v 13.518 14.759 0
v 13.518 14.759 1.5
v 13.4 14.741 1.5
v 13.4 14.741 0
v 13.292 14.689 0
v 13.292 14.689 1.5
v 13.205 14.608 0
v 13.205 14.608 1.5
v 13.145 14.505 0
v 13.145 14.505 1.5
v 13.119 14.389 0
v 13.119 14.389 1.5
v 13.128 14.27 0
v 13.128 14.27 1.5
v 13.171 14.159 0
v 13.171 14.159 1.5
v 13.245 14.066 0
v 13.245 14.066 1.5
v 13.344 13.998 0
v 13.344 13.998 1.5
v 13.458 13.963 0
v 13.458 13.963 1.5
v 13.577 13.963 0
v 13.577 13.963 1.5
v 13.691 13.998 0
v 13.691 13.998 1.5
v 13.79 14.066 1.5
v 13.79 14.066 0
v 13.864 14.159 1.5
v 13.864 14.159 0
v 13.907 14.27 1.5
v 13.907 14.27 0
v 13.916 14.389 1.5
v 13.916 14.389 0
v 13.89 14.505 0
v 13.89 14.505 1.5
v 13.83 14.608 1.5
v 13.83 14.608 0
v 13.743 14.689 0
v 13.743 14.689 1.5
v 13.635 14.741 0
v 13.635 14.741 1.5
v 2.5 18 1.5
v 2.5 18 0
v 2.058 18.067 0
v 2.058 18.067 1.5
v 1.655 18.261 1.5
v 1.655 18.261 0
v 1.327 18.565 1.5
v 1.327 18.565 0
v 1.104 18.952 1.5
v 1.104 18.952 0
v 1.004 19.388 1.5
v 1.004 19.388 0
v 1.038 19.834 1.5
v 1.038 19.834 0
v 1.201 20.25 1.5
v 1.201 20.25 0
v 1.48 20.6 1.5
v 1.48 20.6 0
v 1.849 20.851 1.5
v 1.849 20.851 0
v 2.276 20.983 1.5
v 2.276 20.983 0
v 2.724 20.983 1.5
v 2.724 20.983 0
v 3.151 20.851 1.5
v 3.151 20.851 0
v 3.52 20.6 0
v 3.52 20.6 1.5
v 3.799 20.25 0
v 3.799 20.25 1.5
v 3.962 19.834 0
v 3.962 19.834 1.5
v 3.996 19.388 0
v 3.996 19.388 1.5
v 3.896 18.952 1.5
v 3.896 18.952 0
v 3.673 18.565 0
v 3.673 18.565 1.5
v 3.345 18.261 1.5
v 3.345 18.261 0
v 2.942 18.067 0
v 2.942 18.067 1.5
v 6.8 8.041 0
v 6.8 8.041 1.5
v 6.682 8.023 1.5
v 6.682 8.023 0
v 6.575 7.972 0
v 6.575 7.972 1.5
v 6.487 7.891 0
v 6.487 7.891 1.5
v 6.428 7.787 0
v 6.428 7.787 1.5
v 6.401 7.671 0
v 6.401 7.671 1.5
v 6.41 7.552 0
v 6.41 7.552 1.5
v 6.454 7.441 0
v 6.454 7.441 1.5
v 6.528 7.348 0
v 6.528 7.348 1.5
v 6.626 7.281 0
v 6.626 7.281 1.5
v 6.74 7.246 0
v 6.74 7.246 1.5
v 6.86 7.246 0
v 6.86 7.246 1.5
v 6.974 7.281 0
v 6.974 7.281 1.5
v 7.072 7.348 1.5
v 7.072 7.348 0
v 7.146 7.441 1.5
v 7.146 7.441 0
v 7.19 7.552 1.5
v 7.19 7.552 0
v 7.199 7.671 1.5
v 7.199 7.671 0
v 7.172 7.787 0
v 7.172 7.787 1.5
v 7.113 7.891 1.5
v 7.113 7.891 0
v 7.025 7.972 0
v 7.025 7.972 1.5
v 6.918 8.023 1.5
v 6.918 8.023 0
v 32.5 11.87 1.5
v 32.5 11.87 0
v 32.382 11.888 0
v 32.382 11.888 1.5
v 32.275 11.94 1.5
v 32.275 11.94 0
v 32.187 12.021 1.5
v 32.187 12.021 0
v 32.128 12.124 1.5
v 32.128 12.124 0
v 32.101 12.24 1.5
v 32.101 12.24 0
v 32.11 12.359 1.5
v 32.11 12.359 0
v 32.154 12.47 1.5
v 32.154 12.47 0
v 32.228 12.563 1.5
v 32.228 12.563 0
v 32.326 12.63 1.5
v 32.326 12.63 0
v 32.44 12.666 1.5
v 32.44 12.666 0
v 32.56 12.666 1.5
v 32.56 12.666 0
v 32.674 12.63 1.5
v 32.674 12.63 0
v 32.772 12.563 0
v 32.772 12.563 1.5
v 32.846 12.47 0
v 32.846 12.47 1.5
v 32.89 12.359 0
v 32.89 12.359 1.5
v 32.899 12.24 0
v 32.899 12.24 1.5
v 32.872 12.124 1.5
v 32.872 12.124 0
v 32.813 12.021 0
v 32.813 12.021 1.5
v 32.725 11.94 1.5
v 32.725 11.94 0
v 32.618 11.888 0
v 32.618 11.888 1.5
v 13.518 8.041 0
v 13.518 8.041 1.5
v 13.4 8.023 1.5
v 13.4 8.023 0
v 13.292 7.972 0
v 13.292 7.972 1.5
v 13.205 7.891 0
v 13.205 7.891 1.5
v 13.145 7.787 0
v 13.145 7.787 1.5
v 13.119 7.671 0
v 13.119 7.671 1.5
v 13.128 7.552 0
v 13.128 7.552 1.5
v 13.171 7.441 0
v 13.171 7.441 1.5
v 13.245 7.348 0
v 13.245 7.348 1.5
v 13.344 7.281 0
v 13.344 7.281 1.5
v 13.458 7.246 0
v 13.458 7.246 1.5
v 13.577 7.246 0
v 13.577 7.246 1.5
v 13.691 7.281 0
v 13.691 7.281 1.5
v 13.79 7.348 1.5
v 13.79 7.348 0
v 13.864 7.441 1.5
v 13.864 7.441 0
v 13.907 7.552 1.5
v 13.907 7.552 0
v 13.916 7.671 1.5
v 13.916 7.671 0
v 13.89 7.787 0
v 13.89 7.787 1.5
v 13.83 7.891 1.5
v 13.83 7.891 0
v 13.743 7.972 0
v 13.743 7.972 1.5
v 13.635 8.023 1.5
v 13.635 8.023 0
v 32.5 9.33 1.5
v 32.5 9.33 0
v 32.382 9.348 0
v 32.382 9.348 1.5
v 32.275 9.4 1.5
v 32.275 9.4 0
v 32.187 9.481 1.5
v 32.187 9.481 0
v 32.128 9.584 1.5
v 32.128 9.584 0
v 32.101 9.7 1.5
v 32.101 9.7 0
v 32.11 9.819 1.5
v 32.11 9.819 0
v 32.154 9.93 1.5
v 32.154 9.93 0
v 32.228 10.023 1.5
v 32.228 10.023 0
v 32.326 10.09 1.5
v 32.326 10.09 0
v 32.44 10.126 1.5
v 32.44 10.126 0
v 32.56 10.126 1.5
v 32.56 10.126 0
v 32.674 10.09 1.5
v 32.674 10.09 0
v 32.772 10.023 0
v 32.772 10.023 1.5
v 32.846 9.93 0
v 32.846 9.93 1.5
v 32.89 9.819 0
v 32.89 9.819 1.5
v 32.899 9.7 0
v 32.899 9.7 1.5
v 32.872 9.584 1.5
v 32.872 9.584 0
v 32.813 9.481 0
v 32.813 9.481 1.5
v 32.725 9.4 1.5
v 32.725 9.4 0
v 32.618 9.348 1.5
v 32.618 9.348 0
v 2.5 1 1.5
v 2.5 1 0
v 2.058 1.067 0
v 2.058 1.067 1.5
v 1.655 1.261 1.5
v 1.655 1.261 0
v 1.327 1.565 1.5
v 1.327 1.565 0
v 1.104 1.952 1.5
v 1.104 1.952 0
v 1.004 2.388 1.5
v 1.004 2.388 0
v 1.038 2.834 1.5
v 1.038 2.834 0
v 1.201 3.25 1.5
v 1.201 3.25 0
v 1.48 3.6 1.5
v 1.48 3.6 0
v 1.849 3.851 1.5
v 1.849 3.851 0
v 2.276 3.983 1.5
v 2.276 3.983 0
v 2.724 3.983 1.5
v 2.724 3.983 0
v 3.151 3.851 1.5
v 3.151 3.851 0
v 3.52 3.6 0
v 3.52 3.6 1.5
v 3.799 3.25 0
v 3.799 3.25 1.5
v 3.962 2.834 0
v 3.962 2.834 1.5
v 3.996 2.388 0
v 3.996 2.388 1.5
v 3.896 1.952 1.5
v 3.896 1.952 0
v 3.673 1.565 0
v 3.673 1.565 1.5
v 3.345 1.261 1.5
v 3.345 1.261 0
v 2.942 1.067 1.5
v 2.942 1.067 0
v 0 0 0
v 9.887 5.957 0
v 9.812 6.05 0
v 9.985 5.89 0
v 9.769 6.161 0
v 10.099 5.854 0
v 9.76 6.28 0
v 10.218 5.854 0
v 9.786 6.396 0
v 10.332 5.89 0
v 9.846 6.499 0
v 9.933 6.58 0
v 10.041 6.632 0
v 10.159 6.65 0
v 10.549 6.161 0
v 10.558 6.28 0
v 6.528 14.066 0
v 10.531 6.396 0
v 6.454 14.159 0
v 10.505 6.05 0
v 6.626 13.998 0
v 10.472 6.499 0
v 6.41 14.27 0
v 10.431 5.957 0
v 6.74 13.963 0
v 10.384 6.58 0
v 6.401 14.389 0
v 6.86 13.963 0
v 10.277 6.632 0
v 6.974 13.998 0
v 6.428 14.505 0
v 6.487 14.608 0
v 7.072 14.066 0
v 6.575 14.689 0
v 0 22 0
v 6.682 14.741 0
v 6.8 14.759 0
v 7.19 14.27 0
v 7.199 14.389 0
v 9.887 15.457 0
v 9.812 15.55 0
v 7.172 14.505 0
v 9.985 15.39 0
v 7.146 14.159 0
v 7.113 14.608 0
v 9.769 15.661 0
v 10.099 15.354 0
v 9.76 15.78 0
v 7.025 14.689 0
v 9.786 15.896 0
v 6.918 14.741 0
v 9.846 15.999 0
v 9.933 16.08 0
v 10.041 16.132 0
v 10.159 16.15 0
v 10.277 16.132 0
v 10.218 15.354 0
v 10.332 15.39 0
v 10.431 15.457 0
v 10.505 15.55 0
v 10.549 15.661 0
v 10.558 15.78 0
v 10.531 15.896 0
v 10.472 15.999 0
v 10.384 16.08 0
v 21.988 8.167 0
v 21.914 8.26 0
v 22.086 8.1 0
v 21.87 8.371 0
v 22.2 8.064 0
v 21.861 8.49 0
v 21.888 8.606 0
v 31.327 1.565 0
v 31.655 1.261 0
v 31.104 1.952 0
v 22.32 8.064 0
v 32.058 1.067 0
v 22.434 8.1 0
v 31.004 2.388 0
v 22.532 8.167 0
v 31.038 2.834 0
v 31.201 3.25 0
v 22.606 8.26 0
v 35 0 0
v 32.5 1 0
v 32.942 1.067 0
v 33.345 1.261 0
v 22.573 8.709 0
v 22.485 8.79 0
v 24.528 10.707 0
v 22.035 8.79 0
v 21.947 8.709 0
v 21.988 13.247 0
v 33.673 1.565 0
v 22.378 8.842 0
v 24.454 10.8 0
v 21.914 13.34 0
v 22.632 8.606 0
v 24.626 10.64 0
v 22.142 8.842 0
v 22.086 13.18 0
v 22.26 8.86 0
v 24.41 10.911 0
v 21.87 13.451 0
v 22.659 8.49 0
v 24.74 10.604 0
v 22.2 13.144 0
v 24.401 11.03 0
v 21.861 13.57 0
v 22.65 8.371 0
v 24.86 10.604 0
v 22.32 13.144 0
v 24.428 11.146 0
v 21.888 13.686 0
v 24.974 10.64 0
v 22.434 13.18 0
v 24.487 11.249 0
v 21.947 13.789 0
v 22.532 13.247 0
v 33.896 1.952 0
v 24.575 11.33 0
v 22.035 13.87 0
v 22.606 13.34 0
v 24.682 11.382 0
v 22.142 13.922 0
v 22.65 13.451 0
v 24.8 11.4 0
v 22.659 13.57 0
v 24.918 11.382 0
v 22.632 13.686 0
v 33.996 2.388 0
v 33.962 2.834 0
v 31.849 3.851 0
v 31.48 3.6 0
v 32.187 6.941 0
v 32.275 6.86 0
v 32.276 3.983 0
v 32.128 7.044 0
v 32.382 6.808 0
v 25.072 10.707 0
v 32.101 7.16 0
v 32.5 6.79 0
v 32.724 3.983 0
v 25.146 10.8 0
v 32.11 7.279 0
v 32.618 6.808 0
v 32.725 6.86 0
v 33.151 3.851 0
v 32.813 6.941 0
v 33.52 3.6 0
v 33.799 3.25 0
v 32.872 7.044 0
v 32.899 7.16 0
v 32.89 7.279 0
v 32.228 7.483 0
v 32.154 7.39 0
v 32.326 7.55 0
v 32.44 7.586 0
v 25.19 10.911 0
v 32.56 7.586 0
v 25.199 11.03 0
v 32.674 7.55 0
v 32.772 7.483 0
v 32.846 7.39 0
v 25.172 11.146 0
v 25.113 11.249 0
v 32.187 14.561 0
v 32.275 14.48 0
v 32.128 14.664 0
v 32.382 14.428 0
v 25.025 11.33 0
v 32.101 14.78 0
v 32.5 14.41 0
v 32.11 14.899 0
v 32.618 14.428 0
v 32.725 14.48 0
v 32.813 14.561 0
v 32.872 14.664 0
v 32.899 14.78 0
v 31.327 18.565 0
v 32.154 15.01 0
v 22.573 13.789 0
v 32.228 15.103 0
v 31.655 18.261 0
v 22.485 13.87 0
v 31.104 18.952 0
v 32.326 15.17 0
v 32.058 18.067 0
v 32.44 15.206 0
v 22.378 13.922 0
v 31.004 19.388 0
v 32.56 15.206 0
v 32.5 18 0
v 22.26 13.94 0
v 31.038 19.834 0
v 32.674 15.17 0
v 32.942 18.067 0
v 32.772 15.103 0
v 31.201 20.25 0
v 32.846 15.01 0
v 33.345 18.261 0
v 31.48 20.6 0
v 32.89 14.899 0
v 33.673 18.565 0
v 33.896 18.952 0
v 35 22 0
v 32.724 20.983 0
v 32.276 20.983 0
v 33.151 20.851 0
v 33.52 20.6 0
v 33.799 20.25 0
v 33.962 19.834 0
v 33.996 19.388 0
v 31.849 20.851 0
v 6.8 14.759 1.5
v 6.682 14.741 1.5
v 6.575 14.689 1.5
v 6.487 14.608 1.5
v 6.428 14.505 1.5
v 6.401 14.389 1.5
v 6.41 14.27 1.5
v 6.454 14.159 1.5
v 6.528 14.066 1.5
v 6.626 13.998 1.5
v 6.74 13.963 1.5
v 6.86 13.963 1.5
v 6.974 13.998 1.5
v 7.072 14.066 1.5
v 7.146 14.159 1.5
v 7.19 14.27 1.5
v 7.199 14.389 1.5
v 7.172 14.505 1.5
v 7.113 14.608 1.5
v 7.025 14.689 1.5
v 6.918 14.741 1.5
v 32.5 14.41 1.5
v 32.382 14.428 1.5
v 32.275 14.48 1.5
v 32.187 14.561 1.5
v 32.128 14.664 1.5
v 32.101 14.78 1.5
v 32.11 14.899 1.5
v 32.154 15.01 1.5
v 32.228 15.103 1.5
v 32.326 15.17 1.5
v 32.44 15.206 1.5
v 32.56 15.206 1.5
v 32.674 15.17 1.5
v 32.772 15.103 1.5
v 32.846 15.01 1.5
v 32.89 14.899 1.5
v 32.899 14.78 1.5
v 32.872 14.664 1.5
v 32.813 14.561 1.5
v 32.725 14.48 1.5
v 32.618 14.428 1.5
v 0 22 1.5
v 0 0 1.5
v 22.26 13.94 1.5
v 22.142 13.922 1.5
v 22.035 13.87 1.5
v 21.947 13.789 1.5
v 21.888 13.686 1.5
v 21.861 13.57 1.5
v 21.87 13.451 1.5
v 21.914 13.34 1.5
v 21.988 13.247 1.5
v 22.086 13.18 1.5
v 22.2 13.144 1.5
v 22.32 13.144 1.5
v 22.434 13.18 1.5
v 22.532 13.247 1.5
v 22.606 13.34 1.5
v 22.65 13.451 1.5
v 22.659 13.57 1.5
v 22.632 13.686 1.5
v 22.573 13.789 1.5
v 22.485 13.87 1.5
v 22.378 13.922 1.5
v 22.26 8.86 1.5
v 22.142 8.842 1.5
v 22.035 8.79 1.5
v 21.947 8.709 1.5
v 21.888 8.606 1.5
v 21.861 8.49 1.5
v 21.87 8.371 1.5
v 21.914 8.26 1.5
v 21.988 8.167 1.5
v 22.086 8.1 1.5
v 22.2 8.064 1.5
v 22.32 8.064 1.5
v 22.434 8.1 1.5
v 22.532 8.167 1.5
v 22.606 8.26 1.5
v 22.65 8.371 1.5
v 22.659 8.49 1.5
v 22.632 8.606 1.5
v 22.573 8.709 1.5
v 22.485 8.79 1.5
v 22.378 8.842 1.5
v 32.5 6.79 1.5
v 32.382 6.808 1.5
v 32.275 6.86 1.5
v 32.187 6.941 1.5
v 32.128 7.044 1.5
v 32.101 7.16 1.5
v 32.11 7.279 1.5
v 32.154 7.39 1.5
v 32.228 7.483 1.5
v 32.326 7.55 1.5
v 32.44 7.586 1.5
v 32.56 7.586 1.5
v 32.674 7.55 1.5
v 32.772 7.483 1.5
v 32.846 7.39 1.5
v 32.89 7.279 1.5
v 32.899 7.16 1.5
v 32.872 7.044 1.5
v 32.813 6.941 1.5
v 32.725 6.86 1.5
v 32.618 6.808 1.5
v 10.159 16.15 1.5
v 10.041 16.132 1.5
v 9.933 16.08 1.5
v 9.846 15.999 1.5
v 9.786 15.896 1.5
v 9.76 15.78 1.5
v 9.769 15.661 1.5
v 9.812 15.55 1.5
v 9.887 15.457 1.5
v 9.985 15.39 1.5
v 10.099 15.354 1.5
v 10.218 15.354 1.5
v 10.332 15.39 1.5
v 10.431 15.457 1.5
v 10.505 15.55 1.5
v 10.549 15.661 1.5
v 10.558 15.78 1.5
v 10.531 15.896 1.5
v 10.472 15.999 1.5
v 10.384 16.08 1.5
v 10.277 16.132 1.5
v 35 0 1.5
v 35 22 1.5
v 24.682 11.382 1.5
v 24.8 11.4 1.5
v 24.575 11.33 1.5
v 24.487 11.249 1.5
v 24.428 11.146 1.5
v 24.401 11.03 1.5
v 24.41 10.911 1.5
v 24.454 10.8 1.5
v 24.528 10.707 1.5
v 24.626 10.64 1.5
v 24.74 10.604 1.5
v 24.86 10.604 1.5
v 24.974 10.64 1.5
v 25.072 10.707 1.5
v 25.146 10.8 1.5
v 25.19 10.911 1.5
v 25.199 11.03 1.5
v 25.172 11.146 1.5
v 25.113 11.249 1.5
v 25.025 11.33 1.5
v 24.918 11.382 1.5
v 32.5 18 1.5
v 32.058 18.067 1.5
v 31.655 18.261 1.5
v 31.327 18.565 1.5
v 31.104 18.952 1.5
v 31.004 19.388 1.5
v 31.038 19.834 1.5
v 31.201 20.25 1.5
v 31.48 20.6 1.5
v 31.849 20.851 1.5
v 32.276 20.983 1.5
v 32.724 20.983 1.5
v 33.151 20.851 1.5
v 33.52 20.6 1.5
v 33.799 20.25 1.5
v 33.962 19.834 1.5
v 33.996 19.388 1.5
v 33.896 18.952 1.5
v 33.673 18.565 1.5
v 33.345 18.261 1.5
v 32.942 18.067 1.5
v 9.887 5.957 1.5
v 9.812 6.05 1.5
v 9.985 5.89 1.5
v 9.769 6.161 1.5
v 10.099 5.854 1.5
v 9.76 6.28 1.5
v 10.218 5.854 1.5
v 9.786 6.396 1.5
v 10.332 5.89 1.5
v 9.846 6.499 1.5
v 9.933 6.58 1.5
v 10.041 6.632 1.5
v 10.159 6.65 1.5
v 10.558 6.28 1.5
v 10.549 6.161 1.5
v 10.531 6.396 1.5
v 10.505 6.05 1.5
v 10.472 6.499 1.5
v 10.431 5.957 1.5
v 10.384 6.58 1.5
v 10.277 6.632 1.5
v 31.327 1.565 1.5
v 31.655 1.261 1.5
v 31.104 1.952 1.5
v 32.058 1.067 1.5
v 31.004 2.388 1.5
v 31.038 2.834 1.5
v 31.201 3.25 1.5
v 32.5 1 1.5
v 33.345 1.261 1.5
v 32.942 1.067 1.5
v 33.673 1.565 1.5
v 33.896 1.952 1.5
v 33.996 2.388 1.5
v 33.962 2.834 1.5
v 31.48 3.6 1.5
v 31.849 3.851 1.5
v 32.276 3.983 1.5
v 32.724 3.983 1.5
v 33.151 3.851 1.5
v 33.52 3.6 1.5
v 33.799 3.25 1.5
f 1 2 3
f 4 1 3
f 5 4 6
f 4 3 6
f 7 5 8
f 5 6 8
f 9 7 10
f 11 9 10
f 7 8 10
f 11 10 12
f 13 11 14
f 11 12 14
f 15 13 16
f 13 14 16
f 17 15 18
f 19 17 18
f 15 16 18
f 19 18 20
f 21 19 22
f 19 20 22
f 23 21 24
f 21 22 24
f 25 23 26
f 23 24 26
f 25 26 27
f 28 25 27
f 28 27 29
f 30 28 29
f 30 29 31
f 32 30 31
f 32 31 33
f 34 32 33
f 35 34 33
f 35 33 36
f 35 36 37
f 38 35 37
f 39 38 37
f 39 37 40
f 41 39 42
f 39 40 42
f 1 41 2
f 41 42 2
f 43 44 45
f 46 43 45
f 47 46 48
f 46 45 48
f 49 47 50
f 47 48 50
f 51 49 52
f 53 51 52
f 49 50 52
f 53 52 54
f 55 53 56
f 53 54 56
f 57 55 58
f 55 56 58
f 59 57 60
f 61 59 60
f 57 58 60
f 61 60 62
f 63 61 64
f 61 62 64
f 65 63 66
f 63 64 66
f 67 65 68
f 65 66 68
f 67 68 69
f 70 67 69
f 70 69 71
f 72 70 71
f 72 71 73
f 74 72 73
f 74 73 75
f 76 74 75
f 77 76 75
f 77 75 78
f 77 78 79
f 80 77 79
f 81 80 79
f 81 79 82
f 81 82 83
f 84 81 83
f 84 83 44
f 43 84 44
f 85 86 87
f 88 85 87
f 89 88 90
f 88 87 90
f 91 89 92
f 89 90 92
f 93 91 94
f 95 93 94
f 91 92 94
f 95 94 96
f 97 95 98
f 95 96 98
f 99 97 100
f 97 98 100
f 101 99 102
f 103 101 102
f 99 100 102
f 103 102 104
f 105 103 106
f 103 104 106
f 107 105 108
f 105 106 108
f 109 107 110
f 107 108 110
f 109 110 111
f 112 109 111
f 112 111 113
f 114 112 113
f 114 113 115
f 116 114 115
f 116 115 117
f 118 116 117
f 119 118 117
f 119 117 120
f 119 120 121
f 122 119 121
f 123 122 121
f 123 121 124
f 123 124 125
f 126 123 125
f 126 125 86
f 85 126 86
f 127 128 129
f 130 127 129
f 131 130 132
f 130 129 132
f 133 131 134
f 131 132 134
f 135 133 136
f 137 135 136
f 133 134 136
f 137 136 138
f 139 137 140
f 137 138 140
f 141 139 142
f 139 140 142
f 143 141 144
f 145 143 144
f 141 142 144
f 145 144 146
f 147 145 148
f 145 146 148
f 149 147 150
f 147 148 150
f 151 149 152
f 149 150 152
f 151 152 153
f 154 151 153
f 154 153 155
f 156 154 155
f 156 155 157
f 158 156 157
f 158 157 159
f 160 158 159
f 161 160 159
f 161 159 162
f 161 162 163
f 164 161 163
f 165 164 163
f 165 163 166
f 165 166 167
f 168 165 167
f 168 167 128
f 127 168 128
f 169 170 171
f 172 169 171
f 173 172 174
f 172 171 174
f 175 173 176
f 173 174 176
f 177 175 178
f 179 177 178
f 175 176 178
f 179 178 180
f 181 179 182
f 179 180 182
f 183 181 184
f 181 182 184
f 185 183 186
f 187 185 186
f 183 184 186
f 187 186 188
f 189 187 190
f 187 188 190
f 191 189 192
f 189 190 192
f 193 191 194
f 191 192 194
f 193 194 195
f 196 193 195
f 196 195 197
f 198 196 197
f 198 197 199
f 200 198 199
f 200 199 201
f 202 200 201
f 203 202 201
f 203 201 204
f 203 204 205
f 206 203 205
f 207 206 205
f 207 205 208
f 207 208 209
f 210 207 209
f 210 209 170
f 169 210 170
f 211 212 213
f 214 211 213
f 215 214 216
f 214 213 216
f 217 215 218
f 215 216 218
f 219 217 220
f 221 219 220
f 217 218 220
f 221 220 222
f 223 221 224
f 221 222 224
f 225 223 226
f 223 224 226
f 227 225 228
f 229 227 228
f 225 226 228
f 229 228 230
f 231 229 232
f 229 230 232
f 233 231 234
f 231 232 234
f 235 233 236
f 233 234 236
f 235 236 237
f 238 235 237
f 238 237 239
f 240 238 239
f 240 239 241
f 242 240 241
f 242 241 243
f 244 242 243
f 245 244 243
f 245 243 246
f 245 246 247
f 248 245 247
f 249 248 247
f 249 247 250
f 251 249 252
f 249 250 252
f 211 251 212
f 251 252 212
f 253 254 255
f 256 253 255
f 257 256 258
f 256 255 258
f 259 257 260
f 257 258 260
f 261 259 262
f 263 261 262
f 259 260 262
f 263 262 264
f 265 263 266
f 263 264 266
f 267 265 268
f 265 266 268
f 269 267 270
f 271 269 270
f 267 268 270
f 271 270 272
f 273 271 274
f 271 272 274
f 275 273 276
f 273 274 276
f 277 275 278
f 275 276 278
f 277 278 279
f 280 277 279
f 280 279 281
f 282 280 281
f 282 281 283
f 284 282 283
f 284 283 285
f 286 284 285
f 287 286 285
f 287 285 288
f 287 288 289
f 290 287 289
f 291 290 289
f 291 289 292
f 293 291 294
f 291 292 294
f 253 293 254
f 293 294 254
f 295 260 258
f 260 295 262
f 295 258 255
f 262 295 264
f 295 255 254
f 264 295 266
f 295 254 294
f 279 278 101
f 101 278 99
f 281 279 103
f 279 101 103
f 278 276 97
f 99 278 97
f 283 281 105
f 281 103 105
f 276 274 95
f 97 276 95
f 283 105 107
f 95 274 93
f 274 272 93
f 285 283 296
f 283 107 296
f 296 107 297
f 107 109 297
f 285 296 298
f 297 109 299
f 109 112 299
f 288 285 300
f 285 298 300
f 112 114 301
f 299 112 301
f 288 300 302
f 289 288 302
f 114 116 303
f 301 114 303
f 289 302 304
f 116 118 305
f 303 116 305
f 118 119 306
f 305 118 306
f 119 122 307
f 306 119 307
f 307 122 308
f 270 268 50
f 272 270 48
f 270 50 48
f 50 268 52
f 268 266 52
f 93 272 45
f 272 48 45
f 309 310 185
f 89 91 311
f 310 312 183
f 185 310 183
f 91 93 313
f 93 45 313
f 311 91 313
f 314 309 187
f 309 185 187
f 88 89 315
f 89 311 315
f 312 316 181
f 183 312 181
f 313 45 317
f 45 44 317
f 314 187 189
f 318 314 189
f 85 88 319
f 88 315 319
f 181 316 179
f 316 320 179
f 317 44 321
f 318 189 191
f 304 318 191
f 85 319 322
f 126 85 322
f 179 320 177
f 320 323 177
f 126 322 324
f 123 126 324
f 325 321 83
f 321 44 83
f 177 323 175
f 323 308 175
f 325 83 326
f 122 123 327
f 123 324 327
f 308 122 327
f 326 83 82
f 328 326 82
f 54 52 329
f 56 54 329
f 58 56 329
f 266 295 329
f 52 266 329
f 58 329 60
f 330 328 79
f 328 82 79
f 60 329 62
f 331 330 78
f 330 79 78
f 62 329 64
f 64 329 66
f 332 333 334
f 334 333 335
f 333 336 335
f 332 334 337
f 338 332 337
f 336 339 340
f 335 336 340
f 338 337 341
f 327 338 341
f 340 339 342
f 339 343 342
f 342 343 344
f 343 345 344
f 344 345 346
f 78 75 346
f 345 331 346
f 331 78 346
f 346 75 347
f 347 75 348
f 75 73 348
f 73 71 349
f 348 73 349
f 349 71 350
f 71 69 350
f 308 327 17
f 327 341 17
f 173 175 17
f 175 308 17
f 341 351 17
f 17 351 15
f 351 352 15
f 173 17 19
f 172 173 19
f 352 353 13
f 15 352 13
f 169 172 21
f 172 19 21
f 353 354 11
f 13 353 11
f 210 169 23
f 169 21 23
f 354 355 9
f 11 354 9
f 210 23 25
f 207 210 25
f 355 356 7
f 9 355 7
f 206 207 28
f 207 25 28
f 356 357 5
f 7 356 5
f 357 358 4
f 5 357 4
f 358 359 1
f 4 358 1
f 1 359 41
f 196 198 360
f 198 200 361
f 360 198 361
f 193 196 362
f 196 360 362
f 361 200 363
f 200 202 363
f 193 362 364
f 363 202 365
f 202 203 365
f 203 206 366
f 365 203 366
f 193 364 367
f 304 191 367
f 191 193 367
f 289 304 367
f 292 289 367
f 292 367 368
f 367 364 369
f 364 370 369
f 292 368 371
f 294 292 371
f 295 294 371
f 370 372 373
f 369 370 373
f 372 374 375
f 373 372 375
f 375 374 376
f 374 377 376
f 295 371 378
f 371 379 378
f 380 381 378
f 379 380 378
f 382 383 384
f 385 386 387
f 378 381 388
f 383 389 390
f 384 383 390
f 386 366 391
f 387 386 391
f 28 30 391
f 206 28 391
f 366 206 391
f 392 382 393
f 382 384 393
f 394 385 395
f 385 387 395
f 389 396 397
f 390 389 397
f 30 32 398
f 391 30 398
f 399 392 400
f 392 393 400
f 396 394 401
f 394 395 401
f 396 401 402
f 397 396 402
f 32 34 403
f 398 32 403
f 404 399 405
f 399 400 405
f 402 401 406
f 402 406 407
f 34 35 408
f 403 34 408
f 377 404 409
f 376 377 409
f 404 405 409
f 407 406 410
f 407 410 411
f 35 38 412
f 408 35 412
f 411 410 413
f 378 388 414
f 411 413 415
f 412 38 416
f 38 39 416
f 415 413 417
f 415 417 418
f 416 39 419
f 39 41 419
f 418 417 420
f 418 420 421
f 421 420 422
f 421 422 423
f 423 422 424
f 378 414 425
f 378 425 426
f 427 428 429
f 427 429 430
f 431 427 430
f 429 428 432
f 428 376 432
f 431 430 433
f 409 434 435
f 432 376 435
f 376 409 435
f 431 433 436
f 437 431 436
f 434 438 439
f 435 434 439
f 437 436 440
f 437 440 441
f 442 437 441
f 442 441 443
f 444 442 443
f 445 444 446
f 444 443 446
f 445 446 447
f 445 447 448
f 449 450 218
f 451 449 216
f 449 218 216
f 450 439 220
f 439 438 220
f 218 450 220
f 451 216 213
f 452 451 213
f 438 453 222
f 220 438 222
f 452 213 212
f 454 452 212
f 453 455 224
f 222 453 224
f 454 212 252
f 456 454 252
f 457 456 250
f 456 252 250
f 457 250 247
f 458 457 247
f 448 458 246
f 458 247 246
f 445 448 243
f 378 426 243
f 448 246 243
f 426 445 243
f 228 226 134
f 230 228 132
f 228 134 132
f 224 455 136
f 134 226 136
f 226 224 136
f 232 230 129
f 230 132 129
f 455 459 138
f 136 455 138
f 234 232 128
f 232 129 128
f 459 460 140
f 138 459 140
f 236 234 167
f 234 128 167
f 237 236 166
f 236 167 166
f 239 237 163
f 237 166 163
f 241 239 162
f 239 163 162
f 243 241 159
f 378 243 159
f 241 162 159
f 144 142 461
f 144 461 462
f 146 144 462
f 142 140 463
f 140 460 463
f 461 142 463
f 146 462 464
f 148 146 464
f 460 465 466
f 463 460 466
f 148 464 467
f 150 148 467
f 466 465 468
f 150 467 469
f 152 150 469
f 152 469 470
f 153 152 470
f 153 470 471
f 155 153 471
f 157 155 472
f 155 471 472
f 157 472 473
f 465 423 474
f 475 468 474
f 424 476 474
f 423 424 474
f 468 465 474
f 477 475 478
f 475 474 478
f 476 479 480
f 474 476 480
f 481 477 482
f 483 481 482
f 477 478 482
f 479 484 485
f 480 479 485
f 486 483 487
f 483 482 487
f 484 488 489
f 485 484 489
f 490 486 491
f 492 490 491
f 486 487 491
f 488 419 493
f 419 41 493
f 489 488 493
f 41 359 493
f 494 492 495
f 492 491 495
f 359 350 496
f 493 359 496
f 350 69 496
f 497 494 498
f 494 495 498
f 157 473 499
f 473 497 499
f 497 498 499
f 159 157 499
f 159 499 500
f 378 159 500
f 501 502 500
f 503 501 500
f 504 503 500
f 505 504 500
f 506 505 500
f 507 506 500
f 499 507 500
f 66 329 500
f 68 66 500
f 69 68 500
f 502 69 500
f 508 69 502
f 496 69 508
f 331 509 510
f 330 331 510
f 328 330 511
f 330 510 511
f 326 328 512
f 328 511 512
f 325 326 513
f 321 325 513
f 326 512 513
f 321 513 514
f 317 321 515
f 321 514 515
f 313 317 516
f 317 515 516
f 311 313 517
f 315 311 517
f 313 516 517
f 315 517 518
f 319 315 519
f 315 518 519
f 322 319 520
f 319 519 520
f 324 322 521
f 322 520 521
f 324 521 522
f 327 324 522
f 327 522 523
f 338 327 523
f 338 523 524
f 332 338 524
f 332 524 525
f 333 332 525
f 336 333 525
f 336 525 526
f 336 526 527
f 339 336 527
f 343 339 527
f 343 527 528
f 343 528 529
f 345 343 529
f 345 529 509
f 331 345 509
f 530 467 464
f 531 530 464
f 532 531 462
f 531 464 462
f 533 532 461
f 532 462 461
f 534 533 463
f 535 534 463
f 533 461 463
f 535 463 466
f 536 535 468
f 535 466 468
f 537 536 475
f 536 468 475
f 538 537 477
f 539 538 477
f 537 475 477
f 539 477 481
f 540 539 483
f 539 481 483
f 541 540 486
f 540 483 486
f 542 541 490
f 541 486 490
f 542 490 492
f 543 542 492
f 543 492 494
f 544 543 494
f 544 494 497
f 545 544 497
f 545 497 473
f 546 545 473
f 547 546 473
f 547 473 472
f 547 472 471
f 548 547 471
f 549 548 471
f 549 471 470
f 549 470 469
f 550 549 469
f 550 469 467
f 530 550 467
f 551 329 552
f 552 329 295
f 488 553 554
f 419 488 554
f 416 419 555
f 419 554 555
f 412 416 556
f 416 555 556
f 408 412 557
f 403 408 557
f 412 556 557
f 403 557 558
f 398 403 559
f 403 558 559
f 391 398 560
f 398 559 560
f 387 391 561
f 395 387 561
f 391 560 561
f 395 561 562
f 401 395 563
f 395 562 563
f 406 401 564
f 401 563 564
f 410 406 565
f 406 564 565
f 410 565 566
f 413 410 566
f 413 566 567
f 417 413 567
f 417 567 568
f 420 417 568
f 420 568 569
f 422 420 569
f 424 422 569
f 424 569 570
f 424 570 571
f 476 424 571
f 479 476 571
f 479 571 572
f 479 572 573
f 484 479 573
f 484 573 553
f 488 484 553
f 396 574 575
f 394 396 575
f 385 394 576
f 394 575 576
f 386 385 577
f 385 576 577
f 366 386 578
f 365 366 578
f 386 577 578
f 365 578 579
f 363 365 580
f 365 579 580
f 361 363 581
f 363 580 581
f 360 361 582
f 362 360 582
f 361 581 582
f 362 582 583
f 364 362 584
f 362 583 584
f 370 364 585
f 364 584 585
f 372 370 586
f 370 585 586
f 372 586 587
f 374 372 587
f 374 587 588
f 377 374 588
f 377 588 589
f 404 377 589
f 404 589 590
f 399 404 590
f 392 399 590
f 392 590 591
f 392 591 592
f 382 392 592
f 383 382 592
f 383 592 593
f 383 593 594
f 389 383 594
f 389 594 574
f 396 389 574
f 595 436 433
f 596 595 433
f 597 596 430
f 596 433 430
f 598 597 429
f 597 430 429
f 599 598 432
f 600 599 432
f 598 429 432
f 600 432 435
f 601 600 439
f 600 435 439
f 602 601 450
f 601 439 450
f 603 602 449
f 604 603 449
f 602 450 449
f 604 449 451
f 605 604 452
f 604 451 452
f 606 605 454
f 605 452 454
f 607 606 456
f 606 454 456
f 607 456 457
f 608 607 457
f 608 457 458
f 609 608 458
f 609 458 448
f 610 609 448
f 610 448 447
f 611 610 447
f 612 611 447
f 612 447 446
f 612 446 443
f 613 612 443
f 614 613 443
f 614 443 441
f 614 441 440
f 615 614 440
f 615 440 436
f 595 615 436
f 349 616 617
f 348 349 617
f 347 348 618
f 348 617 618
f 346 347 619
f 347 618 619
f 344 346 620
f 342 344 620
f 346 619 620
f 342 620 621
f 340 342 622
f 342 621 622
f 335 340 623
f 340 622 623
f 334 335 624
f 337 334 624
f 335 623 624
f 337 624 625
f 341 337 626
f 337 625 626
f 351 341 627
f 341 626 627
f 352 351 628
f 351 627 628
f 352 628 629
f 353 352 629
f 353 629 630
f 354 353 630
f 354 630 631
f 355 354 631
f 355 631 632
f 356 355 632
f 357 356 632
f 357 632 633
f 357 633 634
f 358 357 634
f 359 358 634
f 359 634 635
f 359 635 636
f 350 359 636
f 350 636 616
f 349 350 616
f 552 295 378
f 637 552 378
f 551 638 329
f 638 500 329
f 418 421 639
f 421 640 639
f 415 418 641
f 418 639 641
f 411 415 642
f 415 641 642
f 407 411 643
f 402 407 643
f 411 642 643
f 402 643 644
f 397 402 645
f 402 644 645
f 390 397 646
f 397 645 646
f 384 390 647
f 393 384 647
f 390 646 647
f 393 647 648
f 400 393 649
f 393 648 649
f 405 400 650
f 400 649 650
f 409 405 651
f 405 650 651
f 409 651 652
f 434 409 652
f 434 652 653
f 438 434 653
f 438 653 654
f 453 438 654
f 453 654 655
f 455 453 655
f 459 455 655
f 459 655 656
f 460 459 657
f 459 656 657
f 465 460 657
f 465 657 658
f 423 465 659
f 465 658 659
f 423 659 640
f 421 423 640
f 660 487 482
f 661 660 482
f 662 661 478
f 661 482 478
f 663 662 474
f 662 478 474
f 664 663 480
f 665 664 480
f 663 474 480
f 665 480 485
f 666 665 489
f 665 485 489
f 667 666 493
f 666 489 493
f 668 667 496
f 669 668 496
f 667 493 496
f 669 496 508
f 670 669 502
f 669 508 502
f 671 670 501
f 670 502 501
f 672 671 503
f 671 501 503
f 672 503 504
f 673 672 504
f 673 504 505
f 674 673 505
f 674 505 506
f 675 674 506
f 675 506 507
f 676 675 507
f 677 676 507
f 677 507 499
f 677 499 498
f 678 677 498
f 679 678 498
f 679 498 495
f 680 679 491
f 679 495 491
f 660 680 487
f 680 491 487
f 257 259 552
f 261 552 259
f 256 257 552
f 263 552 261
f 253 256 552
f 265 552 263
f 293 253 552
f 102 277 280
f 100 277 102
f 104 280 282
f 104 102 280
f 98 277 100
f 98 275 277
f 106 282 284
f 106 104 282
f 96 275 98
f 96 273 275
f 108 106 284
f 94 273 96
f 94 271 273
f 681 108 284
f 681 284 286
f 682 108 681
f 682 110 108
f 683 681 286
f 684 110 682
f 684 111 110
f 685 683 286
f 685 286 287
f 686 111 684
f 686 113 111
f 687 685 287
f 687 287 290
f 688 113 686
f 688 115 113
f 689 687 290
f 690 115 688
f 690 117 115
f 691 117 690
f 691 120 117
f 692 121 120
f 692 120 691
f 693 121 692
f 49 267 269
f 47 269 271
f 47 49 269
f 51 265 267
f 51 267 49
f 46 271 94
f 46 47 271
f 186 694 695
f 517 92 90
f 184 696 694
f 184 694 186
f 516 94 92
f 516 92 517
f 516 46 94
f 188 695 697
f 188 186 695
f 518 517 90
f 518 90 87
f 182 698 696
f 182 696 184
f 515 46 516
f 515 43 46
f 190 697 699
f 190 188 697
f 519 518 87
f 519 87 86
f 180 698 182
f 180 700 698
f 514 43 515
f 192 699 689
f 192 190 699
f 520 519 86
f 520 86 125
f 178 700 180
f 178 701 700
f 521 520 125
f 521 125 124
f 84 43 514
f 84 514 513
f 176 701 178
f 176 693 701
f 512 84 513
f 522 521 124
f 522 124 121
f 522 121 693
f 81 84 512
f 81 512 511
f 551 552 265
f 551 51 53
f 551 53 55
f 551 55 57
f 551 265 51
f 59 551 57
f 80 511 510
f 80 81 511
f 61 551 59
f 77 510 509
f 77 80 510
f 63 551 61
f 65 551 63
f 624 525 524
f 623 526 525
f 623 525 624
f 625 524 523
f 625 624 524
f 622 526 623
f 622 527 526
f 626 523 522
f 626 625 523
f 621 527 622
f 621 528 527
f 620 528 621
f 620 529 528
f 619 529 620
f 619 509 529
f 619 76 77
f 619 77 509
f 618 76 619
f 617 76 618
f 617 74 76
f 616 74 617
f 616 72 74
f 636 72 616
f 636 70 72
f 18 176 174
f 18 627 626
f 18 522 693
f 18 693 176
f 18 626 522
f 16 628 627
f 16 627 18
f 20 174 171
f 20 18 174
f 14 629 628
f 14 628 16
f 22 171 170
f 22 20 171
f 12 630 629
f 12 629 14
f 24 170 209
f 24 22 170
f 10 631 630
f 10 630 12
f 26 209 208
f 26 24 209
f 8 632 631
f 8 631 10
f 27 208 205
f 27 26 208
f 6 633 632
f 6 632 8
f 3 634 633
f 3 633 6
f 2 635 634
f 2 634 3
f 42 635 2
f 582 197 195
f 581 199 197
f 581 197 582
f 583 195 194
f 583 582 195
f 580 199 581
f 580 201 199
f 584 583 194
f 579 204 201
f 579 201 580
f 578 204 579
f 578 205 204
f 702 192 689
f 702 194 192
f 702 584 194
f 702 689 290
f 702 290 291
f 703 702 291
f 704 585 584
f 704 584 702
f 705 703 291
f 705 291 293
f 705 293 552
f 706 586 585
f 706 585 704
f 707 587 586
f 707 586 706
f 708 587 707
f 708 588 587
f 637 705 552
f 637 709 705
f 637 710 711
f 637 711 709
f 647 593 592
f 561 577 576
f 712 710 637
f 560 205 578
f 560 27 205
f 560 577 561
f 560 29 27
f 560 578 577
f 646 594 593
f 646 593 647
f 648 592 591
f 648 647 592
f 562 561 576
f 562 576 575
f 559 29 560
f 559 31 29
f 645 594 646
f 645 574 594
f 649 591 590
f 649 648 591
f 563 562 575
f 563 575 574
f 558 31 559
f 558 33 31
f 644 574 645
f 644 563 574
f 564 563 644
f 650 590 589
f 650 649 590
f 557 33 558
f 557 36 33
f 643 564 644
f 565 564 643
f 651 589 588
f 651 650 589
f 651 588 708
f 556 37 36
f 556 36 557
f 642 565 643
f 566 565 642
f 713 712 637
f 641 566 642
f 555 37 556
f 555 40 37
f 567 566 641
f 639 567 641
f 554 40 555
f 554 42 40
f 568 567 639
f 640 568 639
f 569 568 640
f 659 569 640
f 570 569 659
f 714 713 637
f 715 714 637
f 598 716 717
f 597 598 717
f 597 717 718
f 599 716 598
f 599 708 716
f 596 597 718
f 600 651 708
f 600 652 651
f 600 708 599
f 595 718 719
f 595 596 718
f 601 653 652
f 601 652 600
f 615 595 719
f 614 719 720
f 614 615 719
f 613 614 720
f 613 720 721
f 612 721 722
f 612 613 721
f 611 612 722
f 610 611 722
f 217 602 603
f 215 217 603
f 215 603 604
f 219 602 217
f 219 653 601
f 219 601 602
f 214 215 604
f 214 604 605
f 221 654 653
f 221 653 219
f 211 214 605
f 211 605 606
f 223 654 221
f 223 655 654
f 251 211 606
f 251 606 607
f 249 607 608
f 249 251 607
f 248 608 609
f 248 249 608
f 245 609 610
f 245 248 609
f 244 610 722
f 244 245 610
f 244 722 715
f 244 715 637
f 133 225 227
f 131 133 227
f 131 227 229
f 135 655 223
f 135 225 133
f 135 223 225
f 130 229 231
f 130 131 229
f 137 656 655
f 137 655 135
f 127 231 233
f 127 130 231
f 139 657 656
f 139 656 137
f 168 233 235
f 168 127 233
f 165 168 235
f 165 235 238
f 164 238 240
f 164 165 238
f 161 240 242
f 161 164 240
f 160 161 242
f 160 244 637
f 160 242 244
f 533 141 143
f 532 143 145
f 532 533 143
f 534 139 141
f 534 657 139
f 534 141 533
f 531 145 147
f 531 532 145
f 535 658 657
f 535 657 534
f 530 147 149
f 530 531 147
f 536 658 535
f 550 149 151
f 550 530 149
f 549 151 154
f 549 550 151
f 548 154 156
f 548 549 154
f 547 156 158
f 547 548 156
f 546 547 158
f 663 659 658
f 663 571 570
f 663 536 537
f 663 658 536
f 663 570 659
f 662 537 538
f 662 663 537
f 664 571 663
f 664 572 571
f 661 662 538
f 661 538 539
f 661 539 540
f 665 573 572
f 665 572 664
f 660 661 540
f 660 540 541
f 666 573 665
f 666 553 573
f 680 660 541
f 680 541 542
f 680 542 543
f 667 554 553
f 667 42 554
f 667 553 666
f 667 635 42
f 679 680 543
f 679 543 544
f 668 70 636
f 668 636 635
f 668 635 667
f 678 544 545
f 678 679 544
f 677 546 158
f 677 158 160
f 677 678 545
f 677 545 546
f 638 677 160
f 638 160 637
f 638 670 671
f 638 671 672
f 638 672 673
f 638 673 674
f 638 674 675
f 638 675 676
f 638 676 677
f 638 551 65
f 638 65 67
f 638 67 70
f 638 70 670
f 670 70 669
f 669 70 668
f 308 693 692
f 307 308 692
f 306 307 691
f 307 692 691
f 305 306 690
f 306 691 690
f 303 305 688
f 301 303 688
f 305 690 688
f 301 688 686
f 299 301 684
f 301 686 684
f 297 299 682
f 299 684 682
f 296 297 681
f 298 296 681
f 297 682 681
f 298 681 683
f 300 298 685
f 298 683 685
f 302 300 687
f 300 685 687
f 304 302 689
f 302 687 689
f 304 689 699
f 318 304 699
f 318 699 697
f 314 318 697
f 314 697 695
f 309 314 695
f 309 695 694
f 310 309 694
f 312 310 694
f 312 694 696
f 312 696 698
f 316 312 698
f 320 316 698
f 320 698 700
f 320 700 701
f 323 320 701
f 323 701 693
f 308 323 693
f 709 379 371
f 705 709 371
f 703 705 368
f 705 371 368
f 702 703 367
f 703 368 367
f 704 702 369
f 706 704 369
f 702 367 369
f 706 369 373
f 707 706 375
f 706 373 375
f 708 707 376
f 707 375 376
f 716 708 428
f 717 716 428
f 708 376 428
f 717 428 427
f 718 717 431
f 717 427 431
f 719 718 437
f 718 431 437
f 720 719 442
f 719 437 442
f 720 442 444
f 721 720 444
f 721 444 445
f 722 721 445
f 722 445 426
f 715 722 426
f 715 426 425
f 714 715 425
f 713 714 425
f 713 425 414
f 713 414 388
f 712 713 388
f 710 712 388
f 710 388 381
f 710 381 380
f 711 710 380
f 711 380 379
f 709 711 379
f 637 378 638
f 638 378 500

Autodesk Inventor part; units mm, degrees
ref_plane "YZ Plane" through (0, 0, 0) normal (1, 0, 0) x (0, 1, 0)
ref_plane "XZ Plane" through (0, 0, 0) normal (0, 1, 0) x (-1, 0, 0)
ref_plane "XY Plane" through (0, 0, 0) normal (0, 0, 1) x (1, 0, 0)
sketch "Skizze1" plane through (0, 0, 0) normal (0, 0, 1) x (1, 0, 0)
  line L0 (0, 0) -> (35, 0)
  line L1 (35, 0) -> (35, 22)
  line L2 (35, 22) -> (0, 22)
  line L3 (0, 22) -> (0, 0)
  dimension "d0" = 35
  dimension "d1" = 22
extrude "Extrusion1" add sketch "Skizze1" along normal blind 1.5
sketch "Skizze2" plane through (0, 0, 1.5) normal (0, 0, 1) x (1, 0, 0)
  line L0 (0, 0) -> (35, 0) construction
  line L1 (35, 0) -> (35, 22) construction
  line L2 (35, 22) -> (0, 22) construction
  line L3 (0, 22) -> (0, 0) construction
  line L4 (35, 0) -> (35, 22) construction
  line L5 (35, 11) -> (0, 11) construction
  line L6 (0, 22) -> (0, 0) construction
  line L7 (0, 0) -> (35, 0) construction
  line L8 (17.5, 0) -> (17.5, 22) construction
  line L9 (35, 22) -> (0, 22) construction
  point P0 (32.5, 19.5)
  point P1 (32.5, 2.5)
  point P2 (2.5, 19.5)
  point P3 (2.5, 2.5)
  dimension "d4" = 2.5
  dimension "d5" = 2.5
hole "Bohrung1" at (32.5, 19.5, 1.5) at (32.5, 2.5, 1.5) at (2.5, 2.5, 1.5) at (2.5, 19.5, 1.5) direction (0, 0, -1) diameter 3 end through all
sketch "Skizze3" plane through (0, 0, 1.5) normal (0, 0, 1) x (1, 0, 0)
  line L0 (35, 0) -> (35, 22) construction
  circle A0 centre (32.5, 2.5) radius 1.5 construction
  line L1 (32.5, 9.73) -> (32.5, 12.27) construction
  point P0 (0, 0)
  point P1 (32.5, 7.19)
  point P2 (32.5, 14.81)
  point P3 (32.5, 11)
  point P4 (35, 11)
  dimension "d15" = 2.54
hole "Bohrung2" at (32.5, 7.19, 1.5) at (32.5, 9.73, 1.5) at (32.5, 12.27, 1.5) at (32.5, 14.81, 1.5) direction (0, 0, -1) diameter 0.8 end through all
sketch "Skizze4" plane through (0, 0, 0) normal (0, 0, -1) x (-1, 0, 0)
  line L0 (0, 22) -> (0, 0) construction
  line L1 (0, 11) -> (-35, 11) construction
  line L2 (-35, 0) -> (-35, 22) construction
  line L3 (-10.1588, 15.75) -> (-10.1588, 6.25) construction
  point P0 (-6.8, 14.3588)
  point P1 (-13.5175, 14.3588)
  point P2 (-6.8, 7.6412)
  point P3 (-13.5175, 7.6412)
  dimension "d27" = 6.7175
  dimension "d29" = 6.7175
  dimension "d30" = 3.6355
  dimension "d31" = 6.8
hole "Bohrung3" at (6.8, 14.3588, 0) at (10.1588, 15.75, 0) at (13.5175, 14.3588, 0) at (6.8, 7.6412, 0) at (10.1588, 6.25, 0) at (13.5175, 7.6412, 0) direction (0, 0, 1) diameter 0.8 end through all
sketch "Skizze5" plane through (0, 0, 0) normal (0, 0, -1) x (-1, 0, 0)
  line L0 (-35, 0) -> (-35, 22) construction
  line L1 (-35, 11) -> (0, 11) construction
  line L2 (0, 22) -> (0, 0) construction
  point P0 (-22.26, 8.46)
  point P1 (-24.8, 11)
  point P2 (-22.26, 13.54)
  dimension "d39" = 5.08
  dimension "d40" = 2.54
  dimension "d41" = 10.2
hole "Bohrung4" at (22.26, 8.46, 0) at (24.8, 11, 0) at (22.26, 13.54, 0) direction (0, 0, 1) diameter 0.8 end through all
equation "\"d29\" = d27"
properties part number "Platine" material "LCP-Kunststoff"
